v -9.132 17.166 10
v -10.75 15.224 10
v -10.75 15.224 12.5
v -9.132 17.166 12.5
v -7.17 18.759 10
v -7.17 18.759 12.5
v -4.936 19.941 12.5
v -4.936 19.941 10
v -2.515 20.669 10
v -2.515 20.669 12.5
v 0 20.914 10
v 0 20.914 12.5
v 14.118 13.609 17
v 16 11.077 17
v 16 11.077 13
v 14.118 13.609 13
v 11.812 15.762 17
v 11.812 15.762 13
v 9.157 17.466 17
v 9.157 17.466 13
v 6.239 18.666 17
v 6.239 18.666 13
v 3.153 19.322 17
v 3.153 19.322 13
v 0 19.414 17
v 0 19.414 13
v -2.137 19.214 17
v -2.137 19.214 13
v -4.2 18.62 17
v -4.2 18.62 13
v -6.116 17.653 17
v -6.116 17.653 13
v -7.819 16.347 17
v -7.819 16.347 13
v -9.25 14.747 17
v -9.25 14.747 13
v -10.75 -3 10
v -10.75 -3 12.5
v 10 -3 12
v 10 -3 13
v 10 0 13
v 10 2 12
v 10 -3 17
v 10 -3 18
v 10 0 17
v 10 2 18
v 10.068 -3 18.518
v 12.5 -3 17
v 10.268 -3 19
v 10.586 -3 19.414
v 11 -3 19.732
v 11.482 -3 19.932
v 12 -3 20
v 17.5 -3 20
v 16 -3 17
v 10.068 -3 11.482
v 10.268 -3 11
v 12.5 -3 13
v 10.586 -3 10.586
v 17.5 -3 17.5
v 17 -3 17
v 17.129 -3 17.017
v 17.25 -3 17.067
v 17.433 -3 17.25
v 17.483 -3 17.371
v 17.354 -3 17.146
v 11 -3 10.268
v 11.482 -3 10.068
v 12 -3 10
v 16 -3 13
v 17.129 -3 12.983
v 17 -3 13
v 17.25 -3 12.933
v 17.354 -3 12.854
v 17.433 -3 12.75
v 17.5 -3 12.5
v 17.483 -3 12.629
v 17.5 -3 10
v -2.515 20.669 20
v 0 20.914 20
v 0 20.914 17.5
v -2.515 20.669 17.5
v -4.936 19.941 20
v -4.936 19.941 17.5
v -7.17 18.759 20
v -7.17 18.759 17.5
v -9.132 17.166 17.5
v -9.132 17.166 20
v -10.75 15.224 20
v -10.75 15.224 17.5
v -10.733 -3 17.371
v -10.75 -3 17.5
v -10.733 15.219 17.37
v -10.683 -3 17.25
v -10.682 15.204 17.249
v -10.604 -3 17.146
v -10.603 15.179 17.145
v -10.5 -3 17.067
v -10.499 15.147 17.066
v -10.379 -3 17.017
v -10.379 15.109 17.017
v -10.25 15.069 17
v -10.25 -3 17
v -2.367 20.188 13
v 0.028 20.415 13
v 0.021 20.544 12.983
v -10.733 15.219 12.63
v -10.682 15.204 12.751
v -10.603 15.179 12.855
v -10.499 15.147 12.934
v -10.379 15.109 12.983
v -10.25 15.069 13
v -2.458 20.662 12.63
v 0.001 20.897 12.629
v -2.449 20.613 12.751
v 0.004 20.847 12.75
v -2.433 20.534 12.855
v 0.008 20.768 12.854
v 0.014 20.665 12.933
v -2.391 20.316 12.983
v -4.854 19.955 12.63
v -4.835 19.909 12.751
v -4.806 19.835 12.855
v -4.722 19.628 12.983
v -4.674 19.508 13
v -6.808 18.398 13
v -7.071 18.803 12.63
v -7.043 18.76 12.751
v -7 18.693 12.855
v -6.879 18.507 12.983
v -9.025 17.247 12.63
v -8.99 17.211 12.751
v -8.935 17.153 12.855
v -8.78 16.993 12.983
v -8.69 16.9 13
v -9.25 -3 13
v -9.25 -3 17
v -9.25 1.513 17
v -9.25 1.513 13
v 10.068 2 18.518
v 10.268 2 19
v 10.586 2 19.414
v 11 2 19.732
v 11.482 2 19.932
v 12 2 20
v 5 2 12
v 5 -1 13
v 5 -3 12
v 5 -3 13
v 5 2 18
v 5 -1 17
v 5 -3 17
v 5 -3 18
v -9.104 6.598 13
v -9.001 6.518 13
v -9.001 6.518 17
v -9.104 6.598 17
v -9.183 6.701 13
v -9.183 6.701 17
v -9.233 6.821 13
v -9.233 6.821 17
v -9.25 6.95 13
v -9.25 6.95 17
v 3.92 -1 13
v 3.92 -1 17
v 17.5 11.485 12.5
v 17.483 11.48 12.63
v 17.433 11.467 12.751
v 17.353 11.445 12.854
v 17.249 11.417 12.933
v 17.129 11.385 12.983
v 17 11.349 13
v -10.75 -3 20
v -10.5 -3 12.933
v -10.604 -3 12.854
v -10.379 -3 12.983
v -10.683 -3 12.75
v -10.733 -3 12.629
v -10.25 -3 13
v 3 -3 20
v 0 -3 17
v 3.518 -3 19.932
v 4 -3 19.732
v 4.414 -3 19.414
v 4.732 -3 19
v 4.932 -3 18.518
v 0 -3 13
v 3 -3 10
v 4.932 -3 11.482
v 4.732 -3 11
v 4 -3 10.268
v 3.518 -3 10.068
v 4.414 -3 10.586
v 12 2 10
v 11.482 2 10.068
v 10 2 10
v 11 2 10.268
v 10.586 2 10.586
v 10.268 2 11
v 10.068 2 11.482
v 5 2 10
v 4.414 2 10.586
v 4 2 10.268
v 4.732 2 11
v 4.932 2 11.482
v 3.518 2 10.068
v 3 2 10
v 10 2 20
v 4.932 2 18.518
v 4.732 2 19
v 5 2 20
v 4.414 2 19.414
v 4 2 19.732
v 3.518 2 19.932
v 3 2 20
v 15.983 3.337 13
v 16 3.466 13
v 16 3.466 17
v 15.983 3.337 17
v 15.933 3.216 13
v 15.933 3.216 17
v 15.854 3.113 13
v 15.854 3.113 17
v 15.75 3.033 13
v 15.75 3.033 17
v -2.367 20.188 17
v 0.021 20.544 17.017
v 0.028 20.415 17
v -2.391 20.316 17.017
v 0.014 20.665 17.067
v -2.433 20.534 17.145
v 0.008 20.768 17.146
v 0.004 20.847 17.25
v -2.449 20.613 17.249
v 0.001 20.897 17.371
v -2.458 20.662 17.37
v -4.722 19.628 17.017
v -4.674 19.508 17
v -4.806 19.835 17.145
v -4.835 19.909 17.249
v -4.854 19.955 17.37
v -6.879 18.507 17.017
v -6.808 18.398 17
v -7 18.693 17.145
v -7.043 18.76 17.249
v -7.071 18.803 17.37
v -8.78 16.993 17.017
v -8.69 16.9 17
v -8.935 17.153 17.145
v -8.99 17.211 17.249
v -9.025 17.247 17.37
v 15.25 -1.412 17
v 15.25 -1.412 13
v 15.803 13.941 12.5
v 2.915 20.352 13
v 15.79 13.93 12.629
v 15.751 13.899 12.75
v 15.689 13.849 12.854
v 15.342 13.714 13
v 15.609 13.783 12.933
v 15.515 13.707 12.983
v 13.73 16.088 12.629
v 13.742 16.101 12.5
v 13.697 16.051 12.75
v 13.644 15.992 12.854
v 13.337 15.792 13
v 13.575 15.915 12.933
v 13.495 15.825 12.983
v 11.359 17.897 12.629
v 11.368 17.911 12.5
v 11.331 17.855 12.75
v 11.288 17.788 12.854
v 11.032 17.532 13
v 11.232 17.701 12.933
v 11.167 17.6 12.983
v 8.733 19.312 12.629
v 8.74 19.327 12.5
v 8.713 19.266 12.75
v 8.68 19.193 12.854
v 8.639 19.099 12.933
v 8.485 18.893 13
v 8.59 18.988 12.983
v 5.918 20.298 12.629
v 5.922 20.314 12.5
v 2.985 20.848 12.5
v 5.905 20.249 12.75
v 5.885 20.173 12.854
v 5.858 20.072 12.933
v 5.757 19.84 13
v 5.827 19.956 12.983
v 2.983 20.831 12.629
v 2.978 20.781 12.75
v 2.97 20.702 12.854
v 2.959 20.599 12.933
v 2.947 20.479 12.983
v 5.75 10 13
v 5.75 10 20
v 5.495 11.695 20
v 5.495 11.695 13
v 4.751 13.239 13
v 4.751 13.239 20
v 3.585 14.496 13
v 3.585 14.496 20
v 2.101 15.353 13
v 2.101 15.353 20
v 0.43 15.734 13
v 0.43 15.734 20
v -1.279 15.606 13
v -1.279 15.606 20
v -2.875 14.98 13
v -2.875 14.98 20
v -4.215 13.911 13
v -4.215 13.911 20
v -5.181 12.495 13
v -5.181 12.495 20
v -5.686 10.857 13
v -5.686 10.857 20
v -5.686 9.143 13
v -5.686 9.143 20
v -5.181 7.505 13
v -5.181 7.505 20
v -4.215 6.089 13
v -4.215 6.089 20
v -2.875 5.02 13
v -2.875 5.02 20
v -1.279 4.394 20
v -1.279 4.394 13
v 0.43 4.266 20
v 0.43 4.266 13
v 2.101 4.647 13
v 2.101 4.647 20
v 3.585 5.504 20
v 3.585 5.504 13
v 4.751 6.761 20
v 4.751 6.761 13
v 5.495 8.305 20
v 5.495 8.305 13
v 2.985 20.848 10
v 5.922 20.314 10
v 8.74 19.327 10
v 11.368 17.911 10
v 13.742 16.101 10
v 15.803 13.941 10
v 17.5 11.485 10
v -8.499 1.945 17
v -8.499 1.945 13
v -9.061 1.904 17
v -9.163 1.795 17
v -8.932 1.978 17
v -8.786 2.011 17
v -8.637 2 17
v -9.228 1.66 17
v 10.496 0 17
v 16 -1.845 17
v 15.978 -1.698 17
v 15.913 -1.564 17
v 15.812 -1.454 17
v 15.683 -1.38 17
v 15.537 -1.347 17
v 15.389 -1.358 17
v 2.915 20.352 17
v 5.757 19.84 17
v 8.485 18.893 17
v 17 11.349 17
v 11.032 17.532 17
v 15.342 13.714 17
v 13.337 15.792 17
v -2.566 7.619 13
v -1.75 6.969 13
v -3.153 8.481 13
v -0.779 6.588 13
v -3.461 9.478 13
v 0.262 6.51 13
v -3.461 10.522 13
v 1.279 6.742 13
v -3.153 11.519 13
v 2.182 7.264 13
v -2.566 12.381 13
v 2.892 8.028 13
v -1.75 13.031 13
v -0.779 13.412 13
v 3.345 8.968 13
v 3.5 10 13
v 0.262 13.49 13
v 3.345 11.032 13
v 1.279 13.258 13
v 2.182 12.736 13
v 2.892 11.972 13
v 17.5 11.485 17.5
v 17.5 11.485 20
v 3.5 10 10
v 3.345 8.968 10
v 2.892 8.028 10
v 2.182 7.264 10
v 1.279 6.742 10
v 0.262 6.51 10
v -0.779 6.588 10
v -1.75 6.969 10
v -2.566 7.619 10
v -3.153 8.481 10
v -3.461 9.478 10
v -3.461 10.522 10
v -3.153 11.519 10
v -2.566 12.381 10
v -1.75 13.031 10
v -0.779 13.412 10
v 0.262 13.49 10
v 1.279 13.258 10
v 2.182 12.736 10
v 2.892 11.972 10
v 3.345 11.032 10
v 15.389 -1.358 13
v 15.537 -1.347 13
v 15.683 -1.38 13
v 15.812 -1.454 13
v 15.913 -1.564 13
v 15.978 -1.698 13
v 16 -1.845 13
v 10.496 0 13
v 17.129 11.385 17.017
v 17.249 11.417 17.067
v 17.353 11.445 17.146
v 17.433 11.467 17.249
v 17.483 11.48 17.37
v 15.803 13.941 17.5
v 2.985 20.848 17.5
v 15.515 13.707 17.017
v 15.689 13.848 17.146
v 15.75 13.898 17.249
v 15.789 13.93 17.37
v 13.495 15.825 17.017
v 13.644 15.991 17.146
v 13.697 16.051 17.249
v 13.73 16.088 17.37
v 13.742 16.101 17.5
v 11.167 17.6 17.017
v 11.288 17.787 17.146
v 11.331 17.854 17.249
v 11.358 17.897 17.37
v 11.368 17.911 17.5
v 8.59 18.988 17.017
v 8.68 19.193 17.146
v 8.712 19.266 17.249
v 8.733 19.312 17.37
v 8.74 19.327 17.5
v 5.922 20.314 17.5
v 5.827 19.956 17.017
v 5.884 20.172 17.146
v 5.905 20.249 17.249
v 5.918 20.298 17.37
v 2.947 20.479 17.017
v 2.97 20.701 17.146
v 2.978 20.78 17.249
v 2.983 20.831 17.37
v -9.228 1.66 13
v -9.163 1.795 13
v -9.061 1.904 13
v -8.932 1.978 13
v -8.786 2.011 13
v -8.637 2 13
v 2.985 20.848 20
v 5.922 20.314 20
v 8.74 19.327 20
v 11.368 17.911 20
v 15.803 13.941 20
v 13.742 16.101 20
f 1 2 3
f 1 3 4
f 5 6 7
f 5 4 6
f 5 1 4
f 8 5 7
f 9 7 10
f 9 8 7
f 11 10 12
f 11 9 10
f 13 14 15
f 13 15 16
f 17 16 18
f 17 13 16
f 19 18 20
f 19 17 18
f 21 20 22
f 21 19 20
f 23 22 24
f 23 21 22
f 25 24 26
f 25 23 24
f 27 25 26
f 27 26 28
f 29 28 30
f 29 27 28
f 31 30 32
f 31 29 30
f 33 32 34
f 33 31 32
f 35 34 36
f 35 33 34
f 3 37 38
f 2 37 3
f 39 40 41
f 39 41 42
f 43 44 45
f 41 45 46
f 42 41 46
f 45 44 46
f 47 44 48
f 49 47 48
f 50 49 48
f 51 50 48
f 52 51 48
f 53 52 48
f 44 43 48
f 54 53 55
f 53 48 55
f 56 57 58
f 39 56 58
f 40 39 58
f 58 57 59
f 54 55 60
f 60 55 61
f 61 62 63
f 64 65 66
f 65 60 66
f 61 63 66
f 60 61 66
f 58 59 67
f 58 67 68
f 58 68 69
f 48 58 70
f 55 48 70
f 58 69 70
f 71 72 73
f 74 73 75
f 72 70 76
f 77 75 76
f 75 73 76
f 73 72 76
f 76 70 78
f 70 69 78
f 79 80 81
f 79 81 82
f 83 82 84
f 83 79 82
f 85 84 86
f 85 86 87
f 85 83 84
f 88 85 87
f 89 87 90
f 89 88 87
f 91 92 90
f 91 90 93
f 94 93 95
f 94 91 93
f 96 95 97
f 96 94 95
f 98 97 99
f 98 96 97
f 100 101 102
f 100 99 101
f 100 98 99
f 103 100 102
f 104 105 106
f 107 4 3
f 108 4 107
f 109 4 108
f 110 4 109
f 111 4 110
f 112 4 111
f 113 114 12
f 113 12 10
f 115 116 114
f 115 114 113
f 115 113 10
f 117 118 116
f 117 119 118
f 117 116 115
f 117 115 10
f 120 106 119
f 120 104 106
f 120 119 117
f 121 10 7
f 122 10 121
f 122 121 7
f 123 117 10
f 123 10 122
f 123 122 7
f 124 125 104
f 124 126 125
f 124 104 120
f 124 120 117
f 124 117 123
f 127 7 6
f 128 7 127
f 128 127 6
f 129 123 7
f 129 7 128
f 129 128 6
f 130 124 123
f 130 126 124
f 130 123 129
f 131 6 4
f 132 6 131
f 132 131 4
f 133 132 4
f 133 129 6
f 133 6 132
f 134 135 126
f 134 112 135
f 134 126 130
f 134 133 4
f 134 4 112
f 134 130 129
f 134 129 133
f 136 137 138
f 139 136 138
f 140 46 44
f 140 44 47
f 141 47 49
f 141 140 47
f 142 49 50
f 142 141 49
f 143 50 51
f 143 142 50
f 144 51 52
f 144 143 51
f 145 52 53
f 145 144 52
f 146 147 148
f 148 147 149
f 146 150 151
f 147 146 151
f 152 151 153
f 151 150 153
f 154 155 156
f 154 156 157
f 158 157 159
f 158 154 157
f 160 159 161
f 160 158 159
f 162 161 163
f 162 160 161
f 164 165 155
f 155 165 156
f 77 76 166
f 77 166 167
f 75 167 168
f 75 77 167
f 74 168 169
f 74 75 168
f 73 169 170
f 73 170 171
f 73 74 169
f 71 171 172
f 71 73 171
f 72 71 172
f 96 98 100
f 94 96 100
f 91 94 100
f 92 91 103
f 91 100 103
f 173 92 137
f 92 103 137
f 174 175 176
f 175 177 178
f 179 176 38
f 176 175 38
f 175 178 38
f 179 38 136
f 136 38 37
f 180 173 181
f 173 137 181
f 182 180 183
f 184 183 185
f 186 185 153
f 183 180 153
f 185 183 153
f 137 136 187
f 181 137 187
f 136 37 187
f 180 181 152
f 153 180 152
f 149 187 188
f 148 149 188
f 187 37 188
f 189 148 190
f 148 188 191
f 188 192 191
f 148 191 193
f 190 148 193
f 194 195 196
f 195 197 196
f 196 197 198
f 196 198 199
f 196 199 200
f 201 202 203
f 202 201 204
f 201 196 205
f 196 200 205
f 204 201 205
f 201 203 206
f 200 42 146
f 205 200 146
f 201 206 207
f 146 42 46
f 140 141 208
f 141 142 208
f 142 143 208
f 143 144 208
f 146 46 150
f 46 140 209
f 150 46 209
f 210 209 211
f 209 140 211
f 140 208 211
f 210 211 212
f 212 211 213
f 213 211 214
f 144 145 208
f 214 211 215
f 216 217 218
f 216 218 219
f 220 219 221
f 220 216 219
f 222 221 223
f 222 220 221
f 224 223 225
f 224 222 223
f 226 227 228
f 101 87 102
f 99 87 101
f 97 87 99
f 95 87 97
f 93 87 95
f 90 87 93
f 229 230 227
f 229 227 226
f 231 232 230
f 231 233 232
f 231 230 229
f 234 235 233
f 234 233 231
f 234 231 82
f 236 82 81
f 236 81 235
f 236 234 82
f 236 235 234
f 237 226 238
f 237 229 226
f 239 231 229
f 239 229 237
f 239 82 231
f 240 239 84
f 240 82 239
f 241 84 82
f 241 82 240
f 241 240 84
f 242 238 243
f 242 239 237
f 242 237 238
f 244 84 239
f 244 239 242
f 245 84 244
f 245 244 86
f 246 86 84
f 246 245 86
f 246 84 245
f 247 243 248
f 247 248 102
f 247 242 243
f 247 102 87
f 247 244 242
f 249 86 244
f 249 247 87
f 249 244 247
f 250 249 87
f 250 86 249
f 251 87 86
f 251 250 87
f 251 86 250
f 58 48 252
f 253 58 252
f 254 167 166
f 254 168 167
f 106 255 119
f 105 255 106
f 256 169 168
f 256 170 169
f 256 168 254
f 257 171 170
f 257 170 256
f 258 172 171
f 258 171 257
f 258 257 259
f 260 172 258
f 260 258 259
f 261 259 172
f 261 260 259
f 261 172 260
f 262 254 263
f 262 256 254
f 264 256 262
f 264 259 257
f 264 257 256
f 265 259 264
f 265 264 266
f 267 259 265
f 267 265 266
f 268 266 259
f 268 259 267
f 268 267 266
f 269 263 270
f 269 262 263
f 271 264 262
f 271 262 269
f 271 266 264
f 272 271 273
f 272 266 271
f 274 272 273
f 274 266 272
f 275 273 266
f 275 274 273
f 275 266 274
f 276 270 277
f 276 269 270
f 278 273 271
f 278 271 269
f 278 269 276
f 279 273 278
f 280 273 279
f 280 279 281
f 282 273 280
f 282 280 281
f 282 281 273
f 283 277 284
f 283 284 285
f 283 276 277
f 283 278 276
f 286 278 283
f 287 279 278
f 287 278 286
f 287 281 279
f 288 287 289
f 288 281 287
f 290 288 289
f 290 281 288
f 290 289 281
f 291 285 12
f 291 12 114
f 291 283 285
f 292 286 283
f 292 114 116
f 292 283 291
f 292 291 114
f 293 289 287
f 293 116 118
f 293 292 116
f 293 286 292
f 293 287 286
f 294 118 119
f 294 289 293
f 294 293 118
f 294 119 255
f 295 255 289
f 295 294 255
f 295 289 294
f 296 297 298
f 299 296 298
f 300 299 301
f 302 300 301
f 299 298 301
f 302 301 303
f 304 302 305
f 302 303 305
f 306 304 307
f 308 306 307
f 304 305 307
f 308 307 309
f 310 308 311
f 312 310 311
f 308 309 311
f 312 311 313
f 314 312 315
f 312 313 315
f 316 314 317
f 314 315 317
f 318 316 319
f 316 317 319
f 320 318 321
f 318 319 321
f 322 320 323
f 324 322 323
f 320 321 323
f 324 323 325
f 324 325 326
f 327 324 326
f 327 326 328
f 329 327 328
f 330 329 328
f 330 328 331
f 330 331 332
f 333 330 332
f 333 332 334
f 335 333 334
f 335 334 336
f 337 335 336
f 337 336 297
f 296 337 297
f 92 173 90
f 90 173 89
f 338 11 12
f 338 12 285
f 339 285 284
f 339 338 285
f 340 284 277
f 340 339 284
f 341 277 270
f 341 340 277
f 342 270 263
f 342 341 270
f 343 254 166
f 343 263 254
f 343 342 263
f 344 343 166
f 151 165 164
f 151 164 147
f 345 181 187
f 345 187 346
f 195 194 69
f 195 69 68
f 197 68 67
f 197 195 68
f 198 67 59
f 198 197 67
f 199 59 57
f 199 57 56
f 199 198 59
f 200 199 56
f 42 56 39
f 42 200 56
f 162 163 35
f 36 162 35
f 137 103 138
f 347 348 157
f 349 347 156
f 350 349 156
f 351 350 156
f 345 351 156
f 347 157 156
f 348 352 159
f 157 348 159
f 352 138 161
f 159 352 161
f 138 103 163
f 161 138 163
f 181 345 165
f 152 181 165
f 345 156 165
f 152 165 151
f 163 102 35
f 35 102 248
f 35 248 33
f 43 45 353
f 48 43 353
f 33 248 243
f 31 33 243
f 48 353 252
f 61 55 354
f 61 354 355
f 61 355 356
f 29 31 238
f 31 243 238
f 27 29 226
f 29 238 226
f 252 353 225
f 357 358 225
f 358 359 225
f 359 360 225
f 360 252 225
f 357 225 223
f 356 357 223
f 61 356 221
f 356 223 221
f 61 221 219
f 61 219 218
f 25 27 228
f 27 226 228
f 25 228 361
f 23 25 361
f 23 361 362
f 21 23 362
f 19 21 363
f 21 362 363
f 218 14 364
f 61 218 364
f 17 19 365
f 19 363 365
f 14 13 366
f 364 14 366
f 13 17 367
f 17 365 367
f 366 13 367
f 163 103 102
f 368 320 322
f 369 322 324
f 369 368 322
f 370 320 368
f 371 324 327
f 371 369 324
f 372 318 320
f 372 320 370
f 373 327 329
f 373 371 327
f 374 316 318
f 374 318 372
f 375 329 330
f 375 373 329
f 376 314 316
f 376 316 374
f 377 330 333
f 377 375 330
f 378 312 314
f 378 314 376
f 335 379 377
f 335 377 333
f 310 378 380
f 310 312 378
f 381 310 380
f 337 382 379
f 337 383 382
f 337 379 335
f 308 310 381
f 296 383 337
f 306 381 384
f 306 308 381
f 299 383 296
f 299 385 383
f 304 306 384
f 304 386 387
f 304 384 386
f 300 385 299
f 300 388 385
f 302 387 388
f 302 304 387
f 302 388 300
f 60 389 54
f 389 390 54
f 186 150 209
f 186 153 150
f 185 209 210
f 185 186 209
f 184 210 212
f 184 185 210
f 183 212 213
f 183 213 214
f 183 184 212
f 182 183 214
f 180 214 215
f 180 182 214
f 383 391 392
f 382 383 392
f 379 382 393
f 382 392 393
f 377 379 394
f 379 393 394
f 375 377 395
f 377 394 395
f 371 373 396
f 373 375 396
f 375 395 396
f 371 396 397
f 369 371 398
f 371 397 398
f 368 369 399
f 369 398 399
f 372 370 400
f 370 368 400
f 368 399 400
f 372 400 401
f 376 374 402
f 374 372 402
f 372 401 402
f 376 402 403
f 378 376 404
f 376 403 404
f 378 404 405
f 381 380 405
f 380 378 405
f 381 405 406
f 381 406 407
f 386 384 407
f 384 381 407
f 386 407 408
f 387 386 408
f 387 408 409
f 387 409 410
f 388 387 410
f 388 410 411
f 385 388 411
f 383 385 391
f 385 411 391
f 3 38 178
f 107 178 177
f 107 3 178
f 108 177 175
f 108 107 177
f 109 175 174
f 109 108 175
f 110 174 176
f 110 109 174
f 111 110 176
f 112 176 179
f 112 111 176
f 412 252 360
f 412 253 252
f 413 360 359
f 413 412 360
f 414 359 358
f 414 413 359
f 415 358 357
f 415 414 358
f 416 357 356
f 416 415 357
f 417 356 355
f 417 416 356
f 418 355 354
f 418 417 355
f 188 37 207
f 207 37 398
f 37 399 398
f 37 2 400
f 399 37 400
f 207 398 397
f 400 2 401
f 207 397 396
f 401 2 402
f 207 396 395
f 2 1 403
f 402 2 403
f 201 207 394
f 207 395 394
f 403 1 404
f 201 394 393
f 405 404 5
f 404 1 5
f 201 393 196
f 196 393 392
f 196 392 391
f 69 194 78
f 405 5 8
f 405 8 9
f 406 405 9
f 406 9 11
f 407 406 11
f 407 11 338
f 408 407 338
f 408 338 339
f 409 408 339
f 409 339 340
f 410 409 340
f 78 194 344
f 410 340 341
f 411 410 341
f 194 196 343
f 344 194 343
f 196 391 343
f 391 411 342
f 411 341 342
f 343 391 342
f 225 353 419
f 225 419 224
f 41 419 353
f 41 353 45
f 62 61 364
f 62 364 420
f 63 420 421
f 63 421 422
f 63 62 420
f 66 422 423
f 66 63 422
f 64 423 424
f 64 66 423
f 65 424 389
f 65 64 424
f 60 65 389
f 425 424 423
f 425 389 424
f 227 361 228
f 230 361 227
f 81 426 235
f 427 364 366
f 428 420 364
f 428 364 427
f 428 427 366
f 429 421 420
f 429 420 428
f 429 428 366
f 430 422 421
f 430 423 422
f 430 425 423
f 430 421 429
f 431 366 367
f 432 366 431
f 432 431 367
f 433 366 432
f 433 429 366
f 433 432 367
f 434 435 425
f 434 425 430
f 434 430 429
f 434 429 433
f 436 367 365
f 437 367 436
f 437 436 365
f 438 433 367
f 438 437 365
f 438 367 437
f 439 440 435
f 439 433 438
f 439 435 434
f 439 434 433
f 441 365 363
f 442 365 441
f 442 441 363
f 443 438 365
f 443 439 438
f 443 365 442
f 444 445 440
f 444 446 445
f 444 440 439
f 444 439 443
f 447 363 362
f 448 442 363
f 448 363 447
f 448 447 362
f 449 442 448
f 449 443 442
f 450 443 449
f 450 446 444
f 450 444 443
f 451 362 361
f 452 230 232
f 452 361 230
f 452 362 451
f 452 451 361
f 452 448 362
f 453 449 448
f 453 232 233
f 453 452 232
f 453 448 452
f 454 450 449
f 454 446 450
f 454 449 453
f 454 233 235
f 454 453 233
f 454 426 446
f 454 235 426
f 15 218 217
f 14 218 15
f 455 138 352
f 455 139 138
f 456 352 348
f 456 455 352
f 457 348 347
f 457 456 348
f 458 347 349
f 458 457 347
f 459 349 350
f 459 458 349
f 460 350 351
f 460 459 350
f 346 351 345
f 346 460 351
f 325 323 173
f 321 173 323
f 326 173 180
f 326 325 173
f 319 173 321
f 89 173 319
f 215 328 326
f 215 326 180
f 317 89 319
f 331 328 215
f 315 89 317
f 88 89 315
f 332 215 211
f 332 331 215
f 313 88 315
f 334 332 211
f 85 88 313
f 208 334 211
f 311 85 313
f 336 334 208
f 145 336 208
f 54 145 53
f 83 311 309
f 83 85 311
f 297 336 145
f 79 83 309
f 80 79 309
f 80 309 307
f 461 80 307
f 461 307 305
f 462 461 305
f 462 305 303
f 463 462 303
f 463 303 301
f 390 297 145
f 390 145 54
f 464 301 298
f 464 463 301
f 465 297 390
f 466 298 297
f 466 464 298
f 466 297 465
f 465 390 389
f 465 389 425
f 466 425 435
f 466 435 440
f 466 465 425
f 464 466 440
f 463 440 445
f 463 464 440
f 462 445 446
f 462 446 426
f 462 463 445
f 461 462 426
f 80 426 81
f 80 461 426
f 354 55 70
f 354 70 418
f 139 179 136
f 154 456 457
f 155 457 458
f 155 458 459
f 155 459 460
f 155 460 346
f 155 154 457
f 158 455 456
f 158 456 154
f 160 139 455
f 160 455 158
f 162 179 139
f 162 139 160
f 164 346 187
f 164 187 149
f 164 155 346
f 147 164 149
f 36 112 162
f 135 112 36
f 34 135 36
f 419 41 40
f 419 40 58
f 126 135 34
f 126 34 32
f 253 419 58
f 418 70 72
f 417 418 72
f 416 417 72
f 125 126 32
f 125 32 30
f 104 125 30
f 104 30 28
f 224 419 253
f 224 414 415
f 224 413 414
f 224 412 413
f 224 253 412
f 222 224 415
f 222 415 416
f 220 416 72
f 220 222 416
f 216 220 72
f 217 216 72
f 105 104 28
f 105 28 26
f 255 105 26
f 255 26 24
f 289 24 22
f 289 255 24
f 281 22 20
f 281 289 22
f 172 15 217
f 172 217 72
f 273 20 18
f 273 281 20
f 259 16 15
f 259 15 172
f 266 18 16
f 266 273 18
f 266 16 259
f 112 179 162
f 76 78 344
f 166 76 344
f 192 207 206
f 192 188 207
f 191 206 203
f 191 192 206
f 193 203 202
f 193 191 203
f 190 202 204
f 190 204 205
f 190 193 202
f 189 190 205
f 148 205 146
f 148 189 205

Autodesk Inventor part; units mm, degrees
ref_plane "YZ Plane" through (0, 0, 0) normal (1, 0, 0) x (0, 1, 0)
ref_plane "XZ Plane" through (0, 0, 0) normal (0, 1, 0) x (-1, 0, 0)
ref_plane "XY Plane" through (0, 0, 0) normal (0, 0, 1) x (1, 0, 0)
ref_plane "作業平面12" through (0, 0, 10) normal (0, 0, 1) x (1, 0, 0)
sketch "スケッチ48" plane through (0, 0, 10) normal (0, 0, 1) x (1, 0, 0)
  line L0 (-10.75, -3) -> (-10.75, 15.2244) projected
  line L1 (-10.75, -3) -> (17.5, -3)
  line L2 (17.5, -3) -> (17.5, 11.485)
  line L3 (-10.75, 11.485) -> (-10.75, -3)
  arc A0 (17.5, 11.485) -> (0, 20.9143) centre (1.069, 1.9444) ccw projected
  arc A1 (0, 20.9143) -> (-10.75, 15.2244) centre (0, 7.9143) ccw
  arc A2 (17.5, 11.485) -> (0, 20.9143) centre (1.069, 1.9444) ccw
  line L4 (-10.75, 15.2244) -> (-10.75, 11.485)
  circle A3 centre (0, 10) radius 3.5 projected
  circle A4 centre (0, 10) radius 3.5
  circle A5 centre (0, 10) radius 5.75
  point P0 (0, 0)
extrude "押し出し40" add sketch "スケッチ48" along normal blind 10 contours L0 A1 A0 L2 L1 | A5
sketch "スケッチ50" plane through (0, 0, 20) normal (0, 0, 1) x (1, 0, 0)
  line L0 (-10.75, -3) -> (17.5, -3) projected
  line L1 (5, -3) -> (10, -3)
  line L2 (10, -3) -> (10, 2)
  line L3 (10, 2) -> (5, 2)
  line L4 (5, 2) -> (5, -3)
  line L5 (-10.75, 15.2244) -> (-10.75, -3) projected
  point P0 (0, 0)
  dimension "d179" = 15.75
  dimension "d180" = 5
  dimension "d181" = 5
extrude "押し出し41" cut sketch "スケッチ50" against normal blind 10
sketch "スケッチ51" plane through (0, 0, 20) normal (0, 0, 1) x (1, 0, 0)
  circle A0 centre (0, 10) radius 5.75
  circle A1 centre (0, 10) radius 3.5 projected
  point P0 (0, 0)
  dimension "d184" = 11.5
extrude "押し出し42" cut sketch "スケッチ51" against normal blind 7
sketch "スケッチ52" plane through (0, 0, 20) normal (0, 0, 1) x (1, 0, 0)
  line L0 (10, -3) -> (17.5, -3) projected
  line L1 (17.5, -3) -> (16, -3)
  line L2 (16, -3) -> (16, 11.0771)
  line L3 (16, 11.0771) -> (17.5, 11.0771)
  line L4 (17.5, 11.0771) -> (17.5, -3)
  line L5 (-10.75, -3) -> (5, -3) projected
  line L6 (-10.75, -3) -> (-9.25, -3)
  line L7 (-9.25, -3) -> (-9.25, 14.7471)
  line L8 (-9.25, 14.7471) -> (-10.75, 14.7471)
  line L9 (-10.75, 14.7471) -> (-10.75, -3)
  arc A0 (0, 20.9143) -> (-10.75, 15.2244) centre (0, 7.9143) ccw projected
  line L10 (0, 20.9143) -> (0, 19.4143)
  arc A1 (0, 19.4143) -> (-9.25, 14.7471) centre (0, 7.9143) ccw
  arc A2 (16, 11.0771) -> (0, 19.4143) centre (1.069, 1.9444) ccw
  arc A3 (17.5, 11.485) -> (0, 20.9143) centre (1.069, 1.9444) ccw projected
  line L11 (-10.75, 15.2244) -> (-10.75, 14.7471)
  line L12 (-10.75, 15.2244) -> (-10.75, -3) projected
  line L13 (17.5, -3) -> (17.5, 11.485) projected
  line L14 (17.5, 11.0771) -> (17.5, 11.485)
  point P0 (0, 0)
  dimension "d187" = 1.5
  dimension "d188" = 1.5
  dimension "d189" = 1.5
extrude "押し出し43" cut sketch "スケッチ52" against normal blind 7
sketch "スケッチ53" plane through (0, 0, 20) normal (0, 0, 1) x (1, 0, 0)
  line L0 (10, -3) -> (12.5, -3)
  line L1 (12.5, -3) -> (12.5, 0)
  line L2 (12.5, 0) -> (10, 0)
  line L3 (10, 0) -> (10, -3)
  line L4 (-10.75, -3) -> (5, -3) projected
  line L5 (5, -3) -> (0, -3)
  line L6 (0, -3) -> (0, -1)
  line L7 (0, -1) -> (5, -1)
  line L8 (5, -1) -> (5, -3)
  line L9 (12.5, -3) -> (16, -0.9793)
  line L10 (16, -3) -> (16, 11.0771) projected
  line L11 (10, 2) -> (10, -3) projected
  line L12 (10, -0.2865) -> (16, 3.1776)
  line L13 (10, -3) -> (16, -3) projected
  line L14 (0, -3) -> (-9.25, 2.382)
  line L15 (-9.25, 14.7471) -> (-9.25, -3) projected
  line L16 (5, -3) -> (5, 2) projected
  line L17 (5, -1.6285) -> (-9.25, 6.6628)
  point P0 (0, 0)
  dimension "d192" = 2.5
  dimension "d193" = 3
  dimension "d194" = 2
  dimension "d195" = 5
  dimension "d197" = 3.6
  dimension "d198" = 30
  dimension "d199" = 3.7
extrude "押し出し44" cut sketch "スケッチ53" against normal blind 7 contours L3 L12 L2 L1 L0 | L1 L2 L12 L10 L9 | L3 L2 L12 | L6 L7 L17 L8 L4 | L14 L15 L17 L7 L6 | L17 L7 L8
sketch "スケッチ54" plane through (0, 0, 20) normal (0, 0, 1) x (1, 0, 0)
  line L0 (-10.75, -3) -> (-10.75, 15.2244) projected
  line L1 (-10.75, -3) -> (-10.75, 15.2244)
  arc A0 (0, 19.4143) -> (-9.25, 14.7471) centre (0, 7.9143) ccw projected
  line L2 (-10.75, 15.2244) -> (-9.25, 14.7471)
  line L3 (-9.25, 14.7471) -> (-9.25, 6.6628) projected
  line L4 (-9.25, 14.7471) -> (-9.25, 6.6628)
  line L5 (-9.25, 6.6628) -> (3.9198, -1) projected
  line L6 (-9.25, 6.6628) -> (3.9198, -1)
  line L7 (3.9198, -1) -> (5, -1)
  line L8 (5, 2) -> (5, -3) projected
  line L9 (5, -3) -> (5, -1)
  line L10 (5, -3) -> (0, -3) projected
  line L11 (5, -3) -> (0, -3)
  line L12 (0, -3) -> (-9.25, 2.382)
  line L13 (-9.25, 2.382) -> (-9.25, -3) projected
  line L14 (-9.25, 2.382) -> (-9.25, -3)
  line L15 (-9.25, -3) -> (-10.75, -3)
  line L16 (10, -3) -> (17.5, -3) projected
  line L17 (17.5, 11.485) -> (17.5, -3) projected
  line L18 (17.5, -3) -> (17.5, 11.485)
  arc A1 (16, 11.0771) -> (0, 19.4143) centre (1.069, 1.9444) ccw projected
  line L19 (17.5, 11.485) -> (16, 11.0771)
  line L20 (16, 3.1776) -> (16, 11.0771) projected
  line L21 (16, 11.0771) -> (16, 3.1776)
  line L22 (10.4962, 0) -> (16, 3.1776) projected
  line L23 (16, 3.1776) -> (10.4962, 0)
  line L24 (10, 0) -> (10.4962, 0) projected
  line L25 (10.4962, 0) -> (10, 0)
  line L26 (10, -3) -> (10, 0) projected
  line L27 (10, 0) -> (10, -3)
  line L28 (12.5, -3) -> (10, -3) projected
  line L29 (10, -3) -> (12.5, -3)
  line L30 (16, -3) -> (16, -0.9793) projected
  line L31 (12.5, -3) -> (16, -0.9793)
  line L32 (16, -0.9793) -> (16, -3)
  line L33 (16, -3) -> (17.5, -3)
  arc A2 (0, 20.9143) -> (-10.75, 15.2244) centre (0, 7.9143) ccw projected
  arc A3 (17.5, 11.485) -> (0, 20.9143) centre (1.069, 1.9444) ccw
  arc A4 (-10.75, 0.6042) -> (-10.3133, 0) centre (0, 7.9143) ccw
  arc A5 (-9.4623, -1) -> (-9.25, -1.2201) centre (0, 7.9143) ccw
  arc A6 (10, -0.3923) -> (10.3133, 0) centre (0, 7.9143) ccw
  arc A7 (0, 19.4143) -> (-9.25, 14.7471) centre (0, 7.9143) ccw
  arc A8 (16, 11.0771) -> (0, 19.4143) centre (1.069, 1.9444) ccw
  point P0 (0, 0)
extrude "押し出し45" add sketch "スケッチ54" against normal blind 3 contours L0 L2 L3 L5 L7 L8 L10 L12 L13 L15 | A2 A3 L19 A1 A0 L2 | L17 L16 L30 L31 L26 A6 L24 L22 L20 L19 | A6 L26 L24
fillet "フィレット26" radius 2 4 edges at (5, -0.5, 20) (10, -0.5, 20) (5, -0.5, 10) (10, -0.5, 10)
fillet "フィレット27" radius 0.5 12 edges at (-10.75, 6.1122, 17) (-10.75, 6.1122, 13) (-9.25, 6.6628, 15) (-9.25, 2.382, 15) (17.5, 4.2425, 13) (17.5, 4.2425, 17) (16, 3.1776, 15) (16, -0.9793, 15) (10.0815, 18.6709, 13) (10.0815, 18.6709, 17) (-6.0815, 19.4041, 17) (-6.0815, 19.4041, 13)
properties part number "Gankenkunアンテナパーツ" material "ABS プラスチック"
